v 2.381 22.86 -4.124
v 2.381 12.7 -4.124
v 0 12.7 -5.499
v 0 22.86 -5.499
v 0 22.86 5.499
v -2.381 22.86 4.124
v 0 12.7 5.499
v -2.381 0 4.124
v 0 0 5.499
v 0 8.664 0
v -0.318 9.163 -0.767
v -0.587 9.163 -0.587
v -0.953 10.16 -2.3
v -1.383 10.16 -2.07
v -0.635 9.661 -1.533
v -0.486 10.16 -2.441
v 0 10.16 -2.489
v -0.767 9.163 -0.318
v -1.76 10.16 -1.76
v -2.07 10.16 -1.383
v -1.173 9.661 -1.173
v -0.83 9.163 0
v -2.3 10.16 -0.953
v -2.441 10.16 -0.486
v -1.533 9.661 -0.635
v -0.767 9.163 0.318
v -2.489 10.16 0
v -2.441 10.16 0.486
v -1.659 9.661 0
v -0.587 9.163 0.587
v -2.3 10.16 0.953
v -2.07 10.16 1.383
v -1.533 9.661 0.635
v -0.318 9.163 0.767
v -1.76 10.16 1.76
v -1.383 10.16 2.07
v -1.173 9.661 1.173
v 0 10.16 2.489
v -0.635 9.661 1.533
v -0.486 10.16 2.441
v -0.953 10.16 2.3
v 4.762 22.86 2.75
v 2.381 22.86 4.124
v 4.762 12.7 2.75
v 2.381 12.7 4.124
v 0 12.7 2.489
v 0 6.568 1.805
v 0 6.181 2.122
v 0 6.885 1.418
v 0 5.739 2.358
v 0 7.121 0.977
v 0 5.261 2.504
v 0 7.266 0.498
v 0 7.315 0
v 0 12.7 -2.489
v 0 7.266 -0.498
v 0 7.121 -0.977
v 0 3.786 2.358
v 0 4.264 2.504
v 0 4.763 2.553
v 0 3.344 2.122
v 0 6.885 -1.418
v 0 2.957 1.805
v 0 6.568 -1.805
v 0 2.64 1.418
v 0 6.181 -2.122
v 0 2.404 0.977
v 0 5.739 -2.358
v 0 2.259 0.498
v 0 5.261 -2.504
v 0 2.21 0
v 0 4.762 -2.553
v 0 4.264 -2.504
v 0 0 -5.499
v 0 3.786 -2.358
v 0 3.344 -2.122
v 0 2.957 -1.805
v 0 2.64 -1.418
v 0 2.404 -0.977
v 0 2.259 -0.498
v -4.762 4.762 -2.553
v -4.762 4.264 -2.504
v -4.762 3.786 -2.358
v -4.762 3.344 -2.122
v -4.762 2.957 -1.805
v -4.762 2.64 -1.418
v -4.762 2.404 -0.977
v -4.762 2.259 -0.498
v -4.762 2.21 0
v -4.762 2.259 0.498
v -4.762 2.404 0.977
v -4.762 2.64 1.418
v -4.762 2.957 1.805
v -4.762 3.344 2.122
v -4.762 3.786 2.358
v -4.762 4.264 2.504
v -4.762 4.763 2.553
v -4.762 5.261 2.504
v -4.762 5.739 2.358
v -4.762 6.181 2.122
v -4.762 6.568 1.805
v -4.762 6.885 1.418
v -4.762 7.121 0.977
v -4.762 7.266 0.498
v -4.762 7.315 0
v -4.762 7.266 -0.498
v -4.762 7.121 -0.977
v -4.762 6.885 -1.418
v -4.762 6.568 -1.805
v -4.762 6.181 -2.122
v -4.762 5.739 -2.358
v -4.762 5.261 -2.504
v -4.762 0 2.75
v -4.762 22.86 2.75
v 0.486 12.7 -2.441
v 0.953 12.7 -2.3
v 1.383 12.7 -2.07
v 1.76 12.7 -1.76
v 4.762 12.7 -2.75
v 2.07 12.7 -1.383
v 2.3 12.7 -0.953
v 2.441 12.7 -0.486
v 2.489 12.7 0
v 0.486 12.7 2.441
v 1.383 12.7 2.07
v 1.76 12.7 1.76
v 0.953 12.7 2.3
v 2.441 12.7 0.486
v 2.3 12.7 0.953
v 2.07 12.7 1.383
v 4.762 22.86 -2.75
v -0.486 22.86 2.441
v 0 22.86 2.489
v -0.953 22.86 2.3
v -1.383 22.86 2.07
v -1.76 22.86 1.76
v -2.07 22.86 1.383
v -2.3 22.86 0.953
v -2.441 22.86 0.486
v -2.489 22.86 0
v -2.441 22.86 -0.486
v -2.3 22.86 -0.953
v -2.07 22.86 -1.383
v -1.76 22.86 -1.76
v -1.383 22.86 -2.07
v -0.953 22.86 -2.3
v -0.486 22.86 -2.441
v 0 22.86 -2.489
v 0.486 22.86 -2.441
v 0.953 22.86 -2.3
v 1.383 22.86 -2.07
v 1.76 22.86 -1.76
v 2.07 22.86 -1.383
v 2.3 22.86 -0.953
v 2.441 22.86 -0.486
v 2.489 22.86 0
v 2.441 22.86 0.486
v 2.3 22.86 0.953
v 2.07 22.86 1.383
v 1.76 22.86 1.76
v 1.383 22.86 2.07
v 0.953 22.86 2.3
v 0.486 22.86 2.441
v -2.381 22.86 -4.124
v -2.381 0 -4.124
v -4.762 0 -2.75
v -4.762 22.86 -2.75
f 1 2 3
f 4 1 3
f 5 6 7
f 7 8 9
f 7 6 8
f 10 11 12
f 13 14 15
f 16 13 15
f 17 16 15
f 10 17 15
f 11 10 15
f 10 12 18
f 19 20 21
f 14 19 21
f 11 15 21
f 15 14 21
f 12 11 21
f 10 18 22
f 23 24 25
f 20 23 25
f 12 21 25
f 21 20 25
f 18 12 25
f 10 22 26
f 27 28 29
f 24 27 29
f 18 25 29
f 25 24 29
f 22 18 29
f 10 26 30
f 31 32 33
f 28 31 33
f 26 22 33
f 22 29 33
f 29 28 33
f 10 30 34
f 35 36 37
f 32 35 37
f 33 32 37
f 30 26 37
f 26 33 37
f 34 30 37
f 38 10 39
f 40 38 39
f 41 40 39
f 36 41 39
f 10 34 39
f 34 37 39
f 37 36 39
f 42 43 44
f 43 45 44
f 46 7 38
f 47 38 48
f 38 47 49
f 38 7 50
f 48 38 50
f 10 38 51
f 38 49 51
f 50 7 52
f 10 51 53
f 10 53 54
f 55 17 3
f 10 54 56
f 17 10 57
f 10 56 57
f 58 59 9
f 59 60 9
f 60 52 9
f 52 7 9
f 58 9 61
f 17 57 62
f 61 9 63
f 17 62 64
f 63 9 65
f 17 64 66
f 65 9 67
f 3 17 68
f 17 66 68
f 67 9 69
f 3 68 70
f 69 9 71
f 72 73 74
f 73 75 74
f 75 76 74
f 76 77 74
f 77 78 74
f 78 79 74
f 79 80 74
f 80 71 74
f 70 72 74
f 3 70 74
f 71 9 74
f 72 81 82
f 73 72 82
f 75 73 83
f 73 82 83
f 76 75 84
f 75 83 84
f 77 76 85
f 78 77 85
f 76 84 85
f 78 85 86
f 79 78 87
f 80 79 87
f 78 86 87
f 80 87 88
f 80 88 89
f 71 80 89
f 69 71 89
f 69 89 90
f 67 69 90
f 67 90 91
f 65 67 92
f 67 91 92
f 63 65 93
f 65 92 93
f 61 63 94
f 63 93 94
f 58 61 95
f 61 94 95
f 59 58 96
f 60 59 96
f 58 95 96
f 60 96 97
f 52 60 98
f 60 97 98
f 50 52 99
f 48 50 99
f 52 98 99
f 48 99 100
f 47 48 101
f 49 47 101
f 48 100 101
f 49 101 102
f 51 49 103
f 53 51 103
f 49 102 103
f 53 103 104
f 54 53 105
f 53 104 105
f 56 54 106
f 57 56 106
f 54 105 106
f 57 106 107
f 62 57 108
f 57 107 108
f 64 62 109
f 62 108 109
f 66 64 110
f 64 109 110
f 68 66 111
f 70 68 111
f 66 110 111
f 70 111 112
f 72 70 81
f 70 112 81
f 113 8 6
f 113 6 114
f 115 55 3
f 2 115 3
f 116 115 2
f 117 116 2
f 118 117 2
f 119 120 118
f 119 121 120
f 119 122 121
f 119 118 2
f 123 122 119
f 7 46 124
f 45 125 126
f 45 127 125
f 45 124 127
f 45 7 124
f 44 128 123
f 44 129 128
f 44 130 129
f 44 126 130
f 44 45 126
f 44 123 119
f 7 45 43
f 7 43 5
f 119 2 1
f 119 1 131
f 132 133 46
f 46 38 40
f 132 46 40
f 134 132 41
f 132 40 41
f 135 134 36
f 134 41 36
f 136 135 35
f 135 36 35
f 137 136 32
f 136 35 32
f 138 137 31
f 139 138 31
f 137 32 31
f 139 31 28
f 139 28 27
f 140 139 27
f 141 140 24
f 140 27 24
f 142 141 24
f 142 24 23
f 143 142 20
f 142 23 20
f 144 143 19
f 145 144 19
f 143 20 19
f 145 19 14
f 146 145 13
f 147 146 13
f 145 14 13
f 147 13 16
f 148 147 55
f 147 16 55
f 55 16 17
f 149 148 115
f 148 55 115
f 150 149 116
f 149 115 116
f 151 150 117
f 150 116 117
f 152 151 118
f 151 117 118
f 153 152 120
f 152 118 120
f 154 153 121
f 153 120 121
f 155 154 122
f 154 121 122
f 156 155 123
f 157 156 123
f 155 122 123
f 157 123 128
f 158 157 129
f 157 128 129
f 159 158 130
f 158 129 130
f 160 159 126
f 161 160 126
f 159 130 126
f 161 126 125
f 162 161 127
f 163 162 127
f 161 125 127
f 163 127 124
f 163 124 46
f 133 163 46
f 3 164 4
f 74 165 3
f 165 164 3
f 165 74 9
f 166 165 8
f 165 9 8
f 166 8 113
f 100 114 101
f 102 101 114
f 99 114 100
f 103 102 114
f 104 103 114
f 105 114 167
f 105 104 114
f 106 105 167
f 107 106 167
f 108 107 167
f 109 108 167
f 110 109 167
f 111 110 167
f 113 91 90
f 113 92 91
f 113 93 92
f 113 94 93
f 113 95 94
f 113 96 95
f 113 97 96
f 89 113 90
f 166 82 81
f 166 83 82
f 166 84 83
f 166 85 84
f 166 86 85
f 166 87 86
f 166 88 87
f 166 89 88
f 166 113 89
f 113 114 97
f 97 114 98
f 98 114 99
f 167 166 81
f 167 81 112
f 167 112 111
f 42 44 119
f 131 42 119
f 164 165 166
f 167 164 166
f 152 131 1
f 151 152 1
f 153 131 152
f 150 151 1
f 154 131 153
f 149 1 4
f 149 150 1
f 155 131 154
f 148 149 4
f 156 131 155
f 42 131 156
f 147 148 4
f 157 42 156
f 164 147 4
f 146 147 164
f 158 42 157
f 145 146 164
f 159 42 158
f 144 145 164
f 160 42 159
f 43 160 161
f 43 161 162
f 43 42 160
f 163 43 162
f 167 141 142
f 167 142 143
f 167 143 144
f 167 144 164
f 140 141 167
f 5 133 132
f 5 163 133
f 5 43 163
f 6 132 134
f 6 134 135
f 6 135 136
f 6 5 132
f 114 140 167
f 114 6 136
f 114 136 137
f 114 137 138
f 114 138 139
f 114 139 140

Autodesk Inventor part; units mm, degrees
ref_plane "YZ Plane" through (0, 0, 0) normal (1, 0, 0) x (0, 1, 0)
ref_plane "XZ Plane" through (0, 0, 0) normal (0, 1, 0) x (-1, 0, 0)
ref_plane "XY Plane" through (0, 0, 0) normal (0, 0, 1) x (1, 0, 0)
sketch "Sketch1" plane through (0, 0, 0) normal (0, 1, 0) x (-1, 0, 0)
  line L0 (0, 0) -> (4.7625, 0)
  line L1 (4.7625, 0) -> (4.7625, -2.7496)
  line L2 (4.7625, 0) -> (7.5121, 0) construction
  line L3 (4.7625, 0) -> (4.7625, 2.7496)
  line L4 (2.3813, 4.1244) -> (0, 5.4993)
  line L5 (2.3813, 4.1244) -> (4.7625, 2.7496)
  line L6 (-2.3813, 4.1244) -> (-4.7625, 2.7496)
  line L7 (-2.3813, 4.1244) -> (0, 5.4993)
  line L8 (-4.7625, 0) -> (-4.7625, -2.7496)
  line L9 (-4.7625, 0) -> (-4.7625, 2.7496)
  line L10 (-2.3812, -4.1244) -> (0, -5.4993)
  line L11 (-2.3812, -4.1244) -> (-4.7625, -2.7496)
  line L12 (2.3813, -4.1244) -> (4.7625, -2.7496)
  line L13 (2.3813, -4.1244) -> (0, -5.4993)
  line L14 (4.7625, 2.7496) -> (4.7625, -2.7496)
  line L15 (4.7625, -2.7496) -> (0, -5.4993)
  line L16 (0, -5.4993) -> (-4.7625, -2.7496)
  line L17 (-4.7625, -2.7496) -> (-4.7625, 2.7496)
  line L18 (-4.7625, 2.7496) -> (0, 5.4993)
  line L19 (4.7625, 2.7496) -> (0, 5.4993)
  dimension "d0" = 4.7625
  dimension "d1" = 90
  dimension "d4" = 360
extrude "Extrusion1" add sketch "Sketch1" along normal blind 22.86
sketch "Sketch2" plane through (0, 22.86, 0) normal (0, 1, 0) x (1, 0, 0)
  point P0 (0, 0)
  point P1 (0, 0)
hole "Hole1" at (0, 22.86, 0) direction (0, -1, 0) diameter 4.9784 depth 12.7 tip angle 118 thread size "1/4-20 UNC" class "2B" standard "ANSI Unified Screw Threads"
sketch "Sketch3" plane through (0, 0, 0) normal (0, -1, 0) x (1, 0, 0)
  line L0 (0, 0) -> (9.2843, 0)
  line L1 (9.2843, 0) -> (9.2843, -7.4131)
  line L2 (9.2843, -7.4131) -> (0, -7.4131)
  line L3 (0, -7.4131) -> (0, 0)
  line L4 (9.2843, 0) -> (9.2843, 7.4131)
  line L5 (9.2843, 7.4131) -> (0, 7.4131)
  line L6 (0, 7.4131) -> (0, 0)
extrude "Extrusion2" cut sketch "Sketch3" against normal blind 12.7
sketch "Sketch5" plane through (0, 0, 5.4993) normal (1, 0, 0) x (0, 0, -1)
  line L0 (10.9985, 0) -> (10.9985, 12.7) projected
  line L1 (0, 0) -> (0, 12.7) projected
  line L2 (5.4993, 0) -> (5.4993, 4.7625)
  circle A0 centre (5.4993, 4.7625) radius 3.3782
  dimension "d17" = 4.7625
  dimension "d18" = 6.7564
hole "Hole2" at (0, 4.7625, 0) direction (-1, 0, 0) diameter 5.1054 end through all clearance for "Flat Head Machine Screw (82)" size "#10" standard "Ansi Unified Screw Threads"
properties part number "feet type 3 part 1 hexagon stock 10-32 hole" material "Aluminum 6061"
